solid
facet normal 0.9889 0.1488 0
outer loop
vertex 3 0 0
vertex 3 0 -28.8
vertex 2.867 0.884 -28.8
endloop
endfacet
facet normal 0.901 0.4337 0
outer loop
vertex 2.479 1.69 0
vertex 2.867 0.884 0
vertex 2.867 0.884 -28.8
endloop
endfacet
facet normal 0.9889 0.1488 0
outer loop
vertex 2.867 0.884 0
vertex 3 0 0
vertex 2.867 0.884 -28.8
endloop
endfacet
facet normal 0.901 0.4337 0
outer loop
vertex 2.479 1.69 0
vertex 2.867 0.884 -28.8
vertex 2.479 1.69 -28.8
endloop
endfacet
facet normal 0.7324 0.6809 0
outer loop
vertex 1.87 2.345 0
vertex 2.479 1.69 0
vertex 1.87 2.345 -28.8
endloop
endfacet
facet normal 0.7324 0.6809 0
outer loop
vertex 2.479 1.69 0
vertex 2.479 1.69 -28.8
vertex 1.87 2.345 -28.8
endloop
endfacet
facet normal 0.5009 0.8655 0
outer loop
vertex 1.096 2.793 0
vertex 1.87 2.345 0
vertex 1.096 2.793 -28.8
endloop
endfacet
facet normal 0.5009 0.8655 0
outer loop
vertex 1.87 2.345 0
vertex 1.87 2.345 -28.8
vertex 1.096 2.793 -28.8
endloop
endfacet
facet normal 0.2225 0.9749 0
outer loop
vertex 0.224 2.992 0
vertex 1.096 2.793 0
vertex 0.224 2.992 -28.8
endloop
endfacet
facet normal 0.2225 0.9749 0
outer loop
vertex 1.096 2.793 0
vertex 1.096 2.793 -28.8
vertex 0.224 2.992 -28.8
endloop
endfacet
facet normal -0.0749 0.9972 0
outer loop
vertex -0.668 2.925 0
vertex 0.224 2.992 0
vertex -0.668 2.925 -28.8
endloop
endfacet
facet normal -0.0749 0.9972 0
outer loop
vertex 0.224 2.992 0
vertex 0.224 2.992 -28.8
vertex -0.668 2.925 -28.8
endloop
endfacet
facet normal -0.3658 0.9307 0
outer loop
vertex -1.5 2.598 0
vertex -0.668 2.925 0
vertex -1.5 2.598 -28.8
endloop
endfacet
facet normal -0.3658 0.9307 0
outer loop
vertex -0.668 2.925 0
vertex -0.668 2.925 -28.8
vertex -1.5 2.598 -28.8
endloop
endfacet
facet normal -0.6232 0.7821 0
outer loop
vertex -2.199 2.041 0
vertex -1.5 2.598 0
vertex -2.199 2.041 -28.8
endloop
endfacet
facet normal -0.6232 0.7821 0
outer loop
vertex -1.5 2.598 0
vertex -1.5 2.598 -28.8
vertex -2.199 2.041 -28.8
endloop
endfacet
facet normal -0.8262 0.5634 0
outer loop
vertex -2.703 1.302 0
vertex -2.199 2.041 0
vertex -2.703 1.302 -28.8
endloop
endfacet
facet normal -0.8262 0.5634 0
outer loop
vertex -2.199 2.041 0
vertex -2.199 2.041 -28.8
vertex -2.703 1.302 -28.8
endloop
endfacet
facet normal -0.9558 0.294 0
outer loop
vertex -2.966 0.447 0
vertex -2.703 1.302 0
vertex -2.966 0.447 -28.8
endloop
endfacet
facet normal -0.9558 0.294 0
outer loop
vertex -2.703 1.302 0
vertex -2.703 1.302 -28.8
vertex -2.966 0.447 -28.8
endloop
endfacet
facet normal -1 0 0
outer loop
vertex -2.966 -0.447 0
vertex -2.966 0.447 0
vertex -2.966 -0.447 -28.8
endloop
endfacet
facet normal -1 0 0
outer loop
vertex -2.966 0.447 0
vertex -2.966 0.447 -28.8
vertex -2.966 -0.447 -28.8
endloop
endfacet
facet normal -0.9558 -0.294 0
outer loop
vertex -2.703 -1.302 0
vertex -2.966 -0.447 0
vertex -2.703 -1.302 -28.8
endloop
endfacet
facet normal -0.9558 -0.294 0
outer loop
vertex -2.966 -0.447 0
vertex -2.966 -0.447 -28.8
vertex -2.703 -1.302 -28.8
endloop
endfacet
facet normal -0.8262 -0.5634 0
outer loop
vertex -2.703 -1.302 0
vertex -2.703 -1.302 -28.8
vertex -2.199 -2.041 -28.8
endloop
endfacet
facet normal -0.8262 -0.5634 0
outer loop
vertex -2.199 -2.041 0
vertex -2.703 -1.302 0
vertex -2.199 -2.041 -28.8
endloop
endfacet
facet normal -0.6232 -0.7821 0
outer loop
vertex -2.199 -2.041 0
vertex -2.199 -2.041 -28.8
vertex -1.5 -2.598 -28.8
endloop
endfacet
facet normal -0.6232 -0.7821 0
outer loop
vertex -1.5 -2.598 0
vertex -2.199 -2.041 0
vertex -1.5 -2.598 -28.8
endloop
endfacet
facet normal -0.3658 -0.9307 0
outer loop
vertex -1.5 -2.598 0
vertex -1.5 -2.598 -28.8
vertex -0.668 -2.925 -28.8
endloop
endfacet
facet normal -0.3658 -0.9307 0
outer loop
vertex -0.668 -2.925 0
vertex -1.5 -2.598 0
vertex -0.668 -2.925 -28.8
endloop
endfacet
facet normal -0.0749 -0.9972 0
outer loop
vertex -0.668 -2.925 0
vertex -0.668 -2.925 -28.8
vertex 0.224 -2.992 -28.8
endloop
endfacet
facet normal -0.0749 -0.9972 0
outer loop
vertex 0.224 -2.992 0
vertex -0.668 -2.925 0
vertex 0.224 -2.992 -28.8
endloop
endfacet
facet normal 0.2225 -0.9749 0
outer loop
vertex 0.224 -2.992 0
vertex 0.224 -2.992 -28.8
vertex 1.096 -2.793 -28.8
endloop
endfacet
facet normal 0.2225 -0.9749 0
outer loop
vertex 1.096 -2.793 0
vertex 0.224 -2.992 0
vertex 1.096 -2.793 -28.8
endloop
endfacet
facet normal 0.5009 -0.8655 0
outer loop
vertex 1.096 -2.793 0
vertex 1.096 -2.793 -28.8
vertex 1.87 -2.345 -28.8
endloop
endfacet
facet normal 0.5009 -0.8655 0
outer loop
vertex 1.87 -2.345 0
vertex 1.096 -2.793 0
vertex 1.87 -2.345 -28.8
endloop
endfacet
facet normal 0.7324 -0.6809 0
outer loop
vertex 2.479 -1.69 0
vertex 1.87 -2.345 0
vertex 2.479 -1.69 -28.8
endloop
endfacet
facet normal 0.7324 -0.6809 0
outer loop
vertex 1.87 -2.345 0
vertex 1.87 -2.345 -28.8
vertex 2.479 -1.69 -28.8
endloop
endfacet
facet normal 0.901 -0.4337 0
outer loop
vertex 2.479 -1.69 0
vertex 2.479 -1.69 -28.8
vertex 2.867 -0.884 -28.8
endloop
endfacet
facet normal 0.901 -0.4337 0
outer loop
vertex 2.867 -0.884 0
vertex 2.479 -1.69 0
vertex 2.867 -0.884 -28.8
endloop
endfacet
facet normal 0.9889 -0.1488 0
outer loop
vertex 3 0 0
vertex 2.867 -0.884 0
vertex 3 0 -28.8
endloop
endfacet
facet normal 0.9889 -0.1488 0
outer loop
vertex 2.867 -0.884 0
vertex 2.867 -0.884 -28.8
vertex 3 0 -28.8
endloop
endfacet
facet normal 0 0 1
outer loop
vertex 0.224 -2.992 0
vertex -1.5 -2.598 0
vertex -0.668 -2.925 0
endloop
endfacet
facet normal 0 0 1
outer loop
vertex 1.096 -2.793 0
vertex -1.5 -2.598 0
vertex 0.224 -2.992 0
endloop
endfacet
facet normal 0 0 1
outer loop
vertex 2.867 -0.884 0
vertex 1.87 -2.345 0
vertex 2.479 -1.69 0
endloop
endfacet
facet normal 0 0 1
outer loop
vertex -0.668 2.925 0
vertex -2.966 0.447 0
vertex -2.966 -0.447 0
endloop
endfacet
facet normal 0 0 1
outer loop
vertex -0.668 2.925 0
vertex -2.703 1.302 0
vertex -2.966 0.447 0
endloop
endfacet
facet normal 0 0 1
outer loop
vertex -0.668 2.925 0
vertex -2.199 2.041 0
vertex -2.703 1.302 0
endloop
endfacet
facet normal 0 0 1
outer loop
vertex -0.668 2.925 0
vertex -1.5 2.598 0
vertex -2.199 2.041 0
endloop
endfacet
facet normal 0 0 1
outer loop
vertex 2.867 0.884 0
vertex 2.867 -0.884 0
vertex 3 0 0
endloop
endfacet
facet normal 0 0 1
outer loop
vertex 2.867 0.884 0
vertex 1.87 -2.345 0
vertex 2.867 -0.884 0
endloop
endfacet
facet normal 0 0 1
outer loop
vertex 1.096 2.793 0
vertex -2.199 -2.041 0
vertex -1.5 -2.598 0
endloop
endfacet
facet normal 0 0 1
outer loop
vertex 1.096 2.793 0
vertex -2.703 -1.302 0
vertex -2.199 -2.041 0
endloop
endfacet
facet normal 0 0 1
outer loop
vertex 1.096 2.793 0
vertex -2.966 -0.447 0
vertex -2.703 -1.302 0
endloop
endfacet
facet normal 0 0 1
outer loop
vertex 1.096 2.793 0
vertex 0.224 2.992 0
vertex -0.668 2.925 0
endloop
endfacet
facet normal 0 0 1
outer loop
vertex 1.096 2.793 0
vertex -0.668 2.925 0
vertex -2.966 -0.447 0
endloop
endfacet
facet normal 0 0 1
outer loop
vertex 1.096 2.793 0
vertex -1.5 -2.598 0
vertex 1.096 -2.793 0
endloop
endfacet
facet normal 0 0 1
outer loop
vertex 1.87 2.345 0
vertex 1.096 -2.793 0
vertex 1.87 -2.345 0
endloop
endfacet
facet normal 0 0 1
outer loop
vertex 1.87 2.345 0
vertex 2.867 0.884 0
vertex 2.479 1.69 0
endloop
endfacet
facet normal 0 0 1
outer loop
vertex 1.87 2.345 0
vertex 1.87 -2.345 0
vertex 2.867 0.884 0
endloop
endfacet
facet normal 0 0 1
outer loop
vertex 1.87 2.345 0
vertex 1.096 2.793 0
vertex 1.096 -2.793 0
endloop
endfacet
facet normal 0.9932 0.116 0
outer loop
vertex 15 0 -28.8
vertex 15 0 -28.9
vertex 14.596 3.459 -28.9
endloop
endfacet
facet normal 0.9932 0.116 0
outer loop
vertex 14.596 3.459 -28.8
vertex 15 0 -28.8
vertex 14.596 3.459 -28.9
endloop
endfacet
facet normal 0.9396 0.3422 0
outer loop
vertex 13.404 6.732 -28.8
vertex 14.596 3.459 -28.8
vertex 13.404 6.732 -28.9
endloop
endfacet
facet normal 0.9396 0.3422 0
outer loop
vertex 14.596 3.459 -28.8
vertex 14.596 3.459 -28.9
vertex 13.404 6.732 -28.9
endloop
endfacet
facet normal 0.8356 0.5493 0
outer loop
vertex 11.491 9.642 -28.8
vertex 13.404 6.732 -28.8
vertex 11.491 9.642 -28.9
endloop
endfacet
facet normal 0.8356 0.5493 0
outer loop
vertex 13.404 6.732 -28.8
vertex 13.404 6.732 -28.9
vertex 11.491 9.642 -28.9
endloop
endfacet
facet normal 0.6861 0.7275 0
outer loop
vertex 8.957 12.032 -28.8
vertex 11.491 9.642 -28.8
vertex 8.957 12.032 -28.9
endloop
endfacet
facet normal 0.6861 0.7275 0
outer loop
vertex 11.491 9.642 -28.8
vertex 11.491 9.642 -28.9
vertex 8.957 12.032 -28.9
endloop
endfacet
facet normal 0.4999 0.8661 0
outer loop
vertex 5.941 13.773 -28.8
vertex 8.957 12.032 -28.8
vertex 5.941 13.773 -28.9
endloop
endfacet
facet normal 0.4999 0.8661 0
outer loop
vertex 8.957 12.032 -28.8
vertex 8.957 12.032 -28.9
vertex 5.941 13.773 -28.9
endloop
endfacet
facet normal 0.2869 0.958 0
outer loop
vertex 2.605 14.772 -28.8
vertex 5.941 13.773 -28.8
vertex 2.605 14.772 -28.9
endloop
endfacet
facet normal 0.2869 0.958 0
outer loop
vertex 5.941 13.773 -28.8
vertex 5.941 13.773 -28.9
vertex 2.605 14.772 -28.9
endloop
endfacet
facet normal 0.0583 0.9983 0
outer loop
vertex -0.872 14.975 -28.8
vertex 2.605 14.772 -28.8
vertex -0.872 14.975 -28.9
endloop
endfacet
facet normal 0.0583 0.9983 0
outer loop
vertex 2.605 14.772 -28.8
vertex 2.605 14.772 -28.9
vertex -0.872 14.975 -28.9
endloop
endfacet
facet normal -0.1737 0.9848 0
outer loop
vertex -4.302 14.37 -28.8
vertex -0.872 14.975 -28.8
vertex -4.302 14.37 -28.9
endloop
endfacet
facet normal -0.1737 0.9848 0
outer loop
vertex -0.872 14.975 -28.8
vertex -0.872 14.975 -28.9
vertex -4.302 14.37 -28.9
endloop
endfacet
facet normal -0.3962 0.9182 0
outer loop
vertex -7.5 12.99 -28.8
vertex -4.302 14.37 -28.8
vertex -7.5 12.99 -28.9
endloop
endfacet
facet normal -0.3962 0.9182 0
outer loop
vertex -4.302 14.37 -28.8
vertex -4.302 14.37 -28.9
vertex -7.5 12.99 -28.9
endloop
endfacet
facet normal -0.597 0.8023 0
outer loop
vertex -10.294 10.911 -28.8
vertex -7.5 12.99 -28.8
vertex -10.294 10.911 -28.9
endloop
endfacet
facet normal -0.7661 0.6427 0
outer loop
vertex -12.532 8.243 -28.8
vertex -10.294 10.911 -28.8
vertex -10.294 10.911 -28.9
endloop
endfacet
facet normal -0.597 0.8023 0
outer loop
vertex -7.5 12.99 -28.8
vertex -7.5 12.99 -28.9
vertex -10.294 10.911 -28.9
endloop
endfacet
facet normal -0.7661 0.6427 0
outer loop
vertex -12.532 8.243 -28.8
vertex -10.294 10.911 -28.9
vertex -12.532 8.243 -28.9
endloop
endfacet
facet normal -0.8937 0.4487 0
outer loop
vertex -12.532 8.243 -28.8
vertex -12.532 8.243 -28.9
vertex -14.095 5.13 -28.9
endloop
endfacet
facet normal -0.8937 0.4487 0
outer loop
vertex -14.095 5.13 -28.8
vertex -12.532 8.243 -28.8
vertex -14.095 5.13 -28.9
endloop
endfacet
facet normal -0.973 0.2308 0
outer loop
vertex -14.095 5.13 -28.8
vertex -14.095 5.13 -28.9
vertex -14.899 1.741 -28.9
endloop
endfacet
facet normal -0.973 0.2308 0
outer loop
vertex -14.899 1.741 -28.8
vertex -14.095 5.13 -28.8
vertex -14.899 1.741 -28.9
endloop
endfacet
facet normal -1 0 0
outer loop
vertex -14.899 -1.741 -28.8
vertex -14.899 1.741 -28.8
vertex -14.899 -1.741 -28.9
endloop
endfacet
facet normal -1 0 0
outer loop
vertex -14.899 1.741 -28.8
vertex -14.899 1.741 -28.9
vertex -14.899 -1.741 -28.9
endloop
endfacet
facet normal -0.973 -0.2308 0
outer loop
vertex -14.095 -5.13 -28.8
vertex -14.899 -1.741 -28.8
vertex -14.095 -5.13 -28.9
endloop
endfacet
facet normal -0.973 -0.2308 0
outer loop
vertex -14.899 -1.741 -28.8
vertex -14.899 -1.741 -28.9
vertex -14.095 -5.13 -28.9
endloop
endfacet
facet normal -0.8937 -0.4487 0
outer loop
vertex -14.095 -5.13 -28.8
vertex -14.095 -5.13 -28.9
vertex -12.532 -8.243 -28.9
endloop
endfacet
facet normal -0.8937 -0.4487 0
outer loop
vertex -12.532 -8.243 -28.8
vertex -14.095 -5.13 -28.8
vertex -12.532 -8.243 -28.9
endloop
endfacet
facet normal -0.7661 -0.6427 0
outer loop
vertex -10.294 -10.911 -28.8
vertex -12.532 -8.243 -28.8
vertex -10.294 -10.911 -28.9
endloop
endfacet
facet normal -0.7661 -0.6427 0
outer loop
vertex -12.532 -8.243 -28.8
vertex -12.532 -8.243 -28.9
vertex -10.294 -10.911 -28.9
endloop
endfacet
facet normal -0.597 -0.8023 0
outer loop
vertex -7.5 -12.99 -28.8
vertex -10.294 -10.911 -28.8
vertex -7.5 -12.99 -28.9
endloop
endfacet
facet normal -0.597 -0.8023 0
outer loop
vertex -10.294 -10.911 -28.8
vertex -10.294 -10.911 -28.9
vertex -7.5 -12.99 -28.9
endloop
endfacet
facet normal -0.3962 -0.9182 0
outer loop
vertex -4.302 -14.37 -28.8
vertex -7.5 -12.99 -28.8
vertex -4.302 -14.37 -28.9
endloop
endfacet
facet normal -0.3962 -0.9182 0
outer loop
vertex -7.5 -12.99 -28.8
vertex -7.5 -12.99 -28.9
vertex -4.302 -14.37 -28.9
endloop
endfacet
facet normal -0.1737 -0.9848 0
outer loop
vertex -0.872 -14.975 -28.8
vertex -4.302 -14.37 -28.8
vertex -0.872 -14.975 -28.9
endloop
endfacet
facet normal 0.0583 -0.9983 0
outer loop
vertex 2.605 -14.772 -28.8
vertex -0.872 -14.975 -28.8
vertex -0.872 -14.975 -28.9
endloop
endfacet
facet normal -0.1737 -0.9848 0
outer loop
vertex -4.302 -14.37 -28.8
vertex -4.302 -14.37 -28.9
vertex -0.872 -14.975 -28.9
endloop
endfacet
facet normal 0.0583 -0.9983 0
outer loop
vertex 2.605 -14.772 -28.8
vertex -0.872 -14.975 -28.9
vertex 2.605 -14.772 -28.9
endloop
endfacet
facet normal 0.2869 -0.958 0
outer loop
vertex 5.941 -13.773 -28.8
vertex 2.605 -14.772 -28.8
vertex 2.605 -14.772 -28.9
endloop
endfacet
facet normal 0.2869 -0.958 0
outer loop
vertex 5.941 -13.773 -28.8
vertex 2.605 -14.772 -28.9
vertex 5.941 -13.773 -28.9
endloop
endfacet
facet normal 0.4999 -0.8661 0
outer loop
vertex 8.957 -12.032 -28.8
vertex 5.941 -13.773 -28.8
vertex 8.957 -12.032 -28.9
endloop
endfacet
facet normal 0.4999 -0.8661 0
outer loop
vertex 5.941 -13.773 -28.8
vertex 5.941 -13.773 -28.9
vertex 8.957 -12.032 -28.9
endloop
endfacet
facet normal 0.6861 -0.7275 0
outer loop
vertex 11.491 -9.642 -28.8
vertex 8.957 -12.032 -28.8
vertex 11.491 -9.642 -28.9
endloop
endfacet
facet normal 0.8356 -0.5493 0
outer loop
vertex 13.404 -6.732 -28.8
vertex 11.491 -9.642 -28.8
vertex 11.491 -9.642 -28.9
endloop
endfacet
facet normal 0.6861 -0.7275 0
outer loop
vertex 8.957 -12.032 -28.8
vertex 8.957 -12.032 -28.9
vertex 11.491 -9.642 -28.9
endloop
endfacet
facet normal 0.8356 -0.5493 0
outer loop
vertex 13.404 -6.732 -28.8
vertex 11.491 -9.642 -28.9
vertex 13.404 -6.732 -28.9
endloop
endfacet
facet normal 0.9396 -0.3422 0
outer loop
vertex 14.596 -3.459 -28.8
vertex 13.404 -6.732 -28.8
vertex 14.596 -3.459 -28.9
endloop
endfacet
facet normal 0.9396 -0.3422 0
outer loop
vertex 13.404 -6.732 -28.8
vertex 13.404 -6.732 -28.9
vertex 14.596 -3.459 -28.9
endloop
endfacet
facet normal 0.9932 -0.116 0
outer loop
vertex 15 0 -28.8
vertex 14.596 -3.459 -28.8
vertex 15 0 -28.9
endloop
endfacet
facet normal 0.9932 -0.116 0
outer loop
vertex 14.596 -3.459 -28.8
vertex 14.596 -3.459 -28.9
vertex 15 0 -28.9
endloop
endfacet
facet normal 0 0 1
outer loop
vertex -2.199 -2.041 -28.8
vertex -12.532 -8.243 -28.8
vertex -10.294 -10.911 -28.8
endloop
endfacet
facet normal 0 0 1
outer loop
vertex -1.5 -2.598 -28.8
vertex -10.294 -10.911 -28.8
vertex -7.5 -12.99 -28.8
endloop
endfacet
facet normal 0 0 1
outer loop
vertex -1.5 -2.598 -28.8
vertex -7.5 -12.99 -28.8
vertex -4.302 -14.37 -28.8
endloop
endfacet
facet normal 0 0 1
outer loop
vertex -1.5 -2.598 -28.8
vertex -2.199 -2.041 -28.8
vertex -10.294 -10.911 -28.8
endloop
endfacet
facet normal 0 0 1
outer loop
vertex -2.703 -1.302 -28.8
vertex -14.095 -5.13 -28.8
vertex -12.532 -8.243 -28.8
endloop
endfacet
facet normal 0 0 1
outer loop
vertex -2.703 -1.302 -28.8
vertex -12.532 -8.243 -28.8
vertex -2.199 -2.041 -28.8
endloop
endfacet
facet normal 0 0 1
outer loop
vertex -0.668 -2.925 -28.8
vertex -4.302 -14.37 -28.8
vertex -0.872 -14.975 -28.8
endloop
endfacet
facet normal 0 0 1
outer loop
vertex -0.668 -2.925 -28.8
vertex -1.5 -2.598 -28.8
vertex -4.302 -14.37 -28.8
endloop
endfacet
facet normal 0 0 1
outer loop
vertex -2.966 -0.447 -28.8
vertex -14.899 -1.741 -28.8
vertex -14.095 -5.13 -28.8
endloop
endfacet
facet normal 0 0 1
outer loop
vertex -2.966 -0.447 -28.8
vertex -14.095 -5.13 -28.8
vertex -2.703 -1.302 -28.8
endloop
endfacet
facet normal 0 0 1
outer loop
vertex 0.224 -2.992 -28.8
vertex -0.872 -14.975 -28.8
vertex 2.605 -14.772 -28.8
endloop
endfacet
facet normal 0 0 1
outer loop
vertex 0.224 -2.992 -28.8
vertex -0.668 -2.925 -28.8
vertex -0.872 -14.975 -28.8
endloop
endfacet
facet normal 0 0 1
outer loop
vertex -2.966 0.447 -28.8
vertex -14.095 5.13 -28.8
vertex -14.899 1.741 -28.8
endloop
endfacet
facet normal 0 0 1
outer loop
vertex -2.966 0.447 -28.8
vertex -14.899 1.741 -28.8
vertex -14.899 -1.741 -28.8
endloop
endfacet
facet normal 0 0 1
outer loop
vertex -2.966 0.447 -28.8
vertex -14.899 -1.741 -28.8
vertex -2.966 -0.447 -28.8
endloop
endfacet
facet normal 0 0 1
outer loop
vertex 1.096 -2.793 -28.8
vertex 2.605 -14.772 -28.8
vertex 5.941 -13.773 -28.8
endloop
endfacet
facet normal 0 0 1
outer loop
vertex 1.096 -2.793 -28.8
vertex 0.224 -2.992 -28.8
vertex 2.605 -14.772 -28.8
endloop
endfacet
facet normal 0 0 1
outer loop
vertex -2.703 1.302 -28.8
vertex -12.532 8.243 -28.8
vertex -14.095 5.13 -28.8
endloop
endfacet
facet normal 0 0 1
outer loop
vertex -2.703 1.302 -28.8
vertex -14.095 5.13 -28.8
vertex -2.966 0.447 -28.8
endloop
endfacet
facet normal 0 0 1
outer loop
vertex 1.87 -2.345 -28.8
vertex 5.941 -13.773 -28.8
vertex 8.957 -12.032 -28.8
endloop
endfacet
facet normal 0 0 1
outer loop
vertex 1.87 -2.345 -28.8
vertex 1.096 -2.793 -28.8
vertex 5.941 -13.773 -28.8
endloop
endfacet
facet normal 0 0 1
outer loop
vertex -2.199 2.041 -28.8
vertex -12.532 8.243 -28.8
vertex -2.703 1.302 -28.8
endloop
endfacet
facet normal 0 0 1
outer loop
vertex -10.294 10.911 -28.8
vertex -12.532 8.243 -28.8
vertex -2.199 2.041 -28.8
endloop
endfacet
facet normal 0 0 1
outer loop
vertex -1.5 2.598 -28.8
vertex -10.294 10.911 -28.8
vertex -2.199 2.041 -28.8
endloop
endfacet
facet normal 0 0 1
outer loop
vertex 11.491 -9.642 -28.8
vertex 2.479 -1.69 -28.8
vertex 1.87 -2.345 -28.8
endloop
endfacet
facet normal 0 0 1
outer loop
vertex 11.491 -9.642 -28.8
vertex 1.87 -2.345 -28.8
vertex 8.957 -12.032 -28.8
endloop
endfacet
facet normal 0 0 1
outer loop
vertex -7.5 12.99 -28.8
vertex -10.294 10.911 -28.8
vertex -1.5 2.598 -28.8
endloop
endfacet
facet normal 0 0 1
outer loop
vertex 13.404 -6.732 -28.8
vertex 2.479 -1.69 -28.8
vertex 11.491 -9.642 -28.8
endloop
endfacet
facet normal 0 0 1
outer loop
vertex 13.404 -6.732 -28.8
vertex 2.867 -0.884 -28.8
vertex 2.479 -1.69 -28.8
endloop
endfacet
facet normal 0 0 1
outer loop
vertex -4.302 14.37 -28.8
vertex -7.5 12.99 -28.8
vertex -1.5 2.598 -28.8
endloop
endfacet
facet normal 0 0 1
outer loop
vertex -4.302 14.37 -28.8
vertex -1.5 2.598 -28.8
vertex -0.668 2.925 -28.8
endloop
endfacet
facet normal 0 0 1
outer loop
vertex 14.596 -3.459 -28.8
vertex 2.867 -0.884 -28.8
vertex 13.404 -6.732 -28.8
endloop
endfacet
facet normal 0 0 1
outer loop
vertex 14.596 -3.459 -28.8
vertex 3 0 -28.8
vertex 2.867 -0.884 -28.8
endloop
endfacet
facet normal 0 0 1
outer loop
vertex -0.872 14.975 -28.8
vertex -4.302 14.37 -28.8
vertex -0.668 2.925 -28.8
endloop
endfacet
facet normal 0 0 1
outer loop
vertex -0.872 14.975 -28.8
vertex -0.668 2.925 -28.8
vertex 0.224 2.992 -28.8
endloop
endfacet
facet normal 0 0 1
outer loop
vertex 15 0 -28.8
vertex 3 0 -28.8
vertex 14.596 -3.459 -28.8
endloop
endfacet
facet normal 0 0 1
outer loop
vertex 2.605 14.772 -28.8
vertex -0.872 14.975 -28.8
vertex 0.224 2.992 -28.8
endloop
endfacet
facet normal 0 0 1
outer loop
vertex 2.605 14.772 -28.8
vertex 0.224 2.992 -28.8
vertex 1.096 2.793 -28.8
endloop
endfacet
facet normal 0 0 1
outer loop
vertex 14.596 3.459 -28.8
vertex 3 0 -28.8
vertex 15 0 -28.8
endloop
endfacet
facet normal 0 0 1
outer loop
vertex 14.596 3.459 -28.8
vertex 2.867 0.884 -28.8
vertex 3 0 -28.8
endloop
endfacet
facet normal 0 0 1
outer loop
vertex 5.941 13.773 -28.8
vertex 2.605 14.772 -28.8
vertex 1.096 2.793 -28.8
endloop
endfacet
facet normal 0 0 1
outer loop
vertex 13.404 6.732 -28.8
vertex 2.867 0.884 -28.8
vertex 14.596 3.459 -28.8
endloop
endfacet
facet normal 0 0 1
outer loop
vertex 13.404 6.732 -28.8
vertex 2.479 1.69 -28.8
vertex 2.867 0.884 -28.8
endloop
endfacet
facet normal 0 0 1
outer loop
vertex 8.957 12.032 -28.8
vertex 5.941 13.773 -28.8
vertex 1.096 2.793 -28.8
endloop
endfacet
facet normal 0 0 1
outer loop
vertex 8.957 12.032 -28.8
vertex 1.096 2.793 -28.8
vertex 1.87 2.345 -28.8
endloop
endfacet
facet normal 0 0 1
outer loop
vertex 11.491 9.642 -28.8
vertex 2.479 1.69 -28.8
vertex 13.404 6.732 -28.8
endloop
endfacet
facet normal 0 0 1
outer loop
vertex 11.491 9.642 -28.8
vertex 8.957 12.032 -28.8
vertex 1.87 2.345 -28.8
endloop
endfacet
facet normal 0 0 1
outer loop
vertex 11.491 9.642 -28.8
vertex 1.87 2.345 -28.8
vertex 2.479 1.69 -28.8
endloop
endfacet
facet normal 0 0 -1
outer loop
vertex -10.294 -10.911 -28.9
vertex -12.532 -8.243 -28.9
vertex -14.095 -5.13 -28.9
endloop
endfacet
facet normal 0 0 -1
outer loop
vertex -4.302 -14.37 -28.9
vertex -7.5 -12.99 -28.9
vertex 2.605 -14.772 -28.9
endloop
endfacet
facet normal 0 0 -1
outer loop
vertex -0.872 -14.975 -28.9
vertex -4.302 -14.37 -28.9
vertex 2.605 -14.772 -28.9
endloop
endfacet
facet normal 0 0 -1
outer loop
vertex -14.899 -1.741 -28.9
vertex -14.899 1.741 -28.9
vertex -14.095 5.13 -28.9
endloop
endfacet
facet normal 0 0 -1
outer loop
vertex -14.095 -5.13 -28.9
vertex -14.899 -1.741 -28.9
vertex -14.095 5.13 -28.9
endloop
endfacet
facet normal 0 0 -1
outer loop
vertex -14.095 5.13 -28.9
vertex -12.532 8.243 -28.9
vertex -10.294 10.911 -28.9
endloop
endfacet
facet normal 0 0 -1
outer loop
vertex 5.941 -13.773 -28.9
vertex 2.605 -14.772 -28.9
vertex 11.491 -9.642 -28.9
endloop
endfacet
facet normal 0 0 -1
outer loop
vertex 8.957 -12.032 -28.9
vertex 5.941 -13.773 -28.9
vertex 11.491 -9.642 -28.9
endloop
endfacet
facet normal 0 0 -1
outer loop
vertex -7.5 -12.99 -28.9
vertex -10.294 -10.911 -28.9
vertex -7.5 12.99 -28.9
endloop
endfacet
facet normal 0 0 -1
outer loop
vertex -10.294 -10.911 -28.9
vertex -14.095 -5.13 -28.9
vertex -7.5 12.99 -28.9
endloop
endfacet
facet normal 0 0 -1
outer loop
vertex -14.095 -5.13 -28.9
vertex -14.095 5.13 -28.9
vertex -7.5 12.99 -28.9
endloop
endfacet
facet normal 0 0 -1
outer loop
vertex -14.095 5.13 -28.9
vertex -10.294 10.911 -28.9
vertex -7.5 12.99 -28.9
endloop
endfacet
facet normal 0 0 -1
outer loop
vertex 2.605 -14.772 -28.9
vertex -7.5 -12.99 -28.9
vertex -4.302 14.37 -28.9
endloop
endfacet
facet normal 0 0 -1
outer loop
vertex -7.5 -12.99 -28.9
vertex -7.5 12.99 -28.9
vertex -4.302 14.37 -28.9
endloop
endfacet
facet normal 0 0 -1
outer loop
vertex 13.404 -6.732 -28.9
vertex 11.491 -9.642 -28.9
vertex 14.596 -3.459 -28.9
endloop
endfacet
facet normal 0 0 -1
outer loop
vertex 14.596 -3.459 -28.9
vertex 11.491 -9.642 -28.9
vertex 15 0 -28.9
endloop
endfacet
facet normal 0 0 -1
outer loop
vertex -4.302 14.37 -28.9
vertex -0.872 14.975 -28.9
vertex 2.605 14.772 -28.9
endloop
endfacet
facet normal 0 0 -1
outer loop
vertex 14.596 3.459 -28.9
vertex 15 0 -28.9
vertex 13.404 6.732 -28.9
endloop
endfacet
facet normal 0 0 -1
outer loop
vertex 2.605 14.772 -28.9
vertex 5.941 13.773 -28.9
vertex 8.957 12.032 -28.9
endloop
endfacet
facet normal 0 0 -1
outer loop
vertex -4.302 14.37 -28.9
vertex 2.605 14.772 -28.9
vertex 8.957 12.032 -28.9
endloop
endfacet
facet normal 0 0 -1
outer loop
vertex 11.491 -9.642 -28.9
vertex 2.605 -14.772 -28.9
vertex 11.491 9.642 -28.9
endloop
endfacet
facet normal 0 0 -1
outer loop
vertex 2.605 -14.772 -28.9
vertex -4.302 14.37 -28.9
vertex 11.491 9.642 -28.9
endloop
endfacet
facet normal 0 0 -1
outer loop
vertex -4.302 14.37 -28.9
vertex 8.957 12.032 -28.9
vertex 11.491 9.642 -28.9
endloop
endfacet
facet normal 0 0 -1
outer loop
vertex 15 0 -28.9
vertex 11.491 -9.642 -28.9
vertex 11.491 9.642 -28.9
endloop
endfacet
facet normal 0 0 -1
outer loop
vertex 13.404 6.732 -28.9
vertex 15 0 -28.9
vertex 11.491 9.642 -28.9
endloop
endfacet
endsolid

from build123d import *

# Parameters (mm, degrees)
CYLINDER_R        = 15
CYLINDER_DEPTH    = 10
CYLINDER001_R     = 3
CYLINDER001_DEPTH = 37.95
CYLINDER002_R     = 15
CYLINDER002_DEPTH = 0.1


with BuildPart() as cylinder:
    # Cylinder → Cylinder (new body)
    with BuildSketch(Plane.XY):
        Circle(CYLINDER_R)
    extrude(amount=CYLINDER_DEPTH)


with BuildPart() as cylinder001:
    # Cylinder001 → Cylinder001 (new body)
    with BuildSketch(Plane.XY.offset(-28.8499)):
        Circle(CYLINDER001_R)
    extrude(amount=CYLINDER001_DEPTH)


with BuildPart() as cut_spar:
    # Cylinder002 → Cylinder002 (new body)
    with BuildSketch(Plane.XY.offset(-28.9)):
        Circle(CYLINDER002_R)
    extrude(amount=CYLINDER002_DEPTH)

    # Fusion: union Cylinder001
    add(cylinder001.part)

    # Cut001: cut Cylinder
    add(cylinder.part, mode=Mode.SUBTRACT)


solid = cut_spar.part
